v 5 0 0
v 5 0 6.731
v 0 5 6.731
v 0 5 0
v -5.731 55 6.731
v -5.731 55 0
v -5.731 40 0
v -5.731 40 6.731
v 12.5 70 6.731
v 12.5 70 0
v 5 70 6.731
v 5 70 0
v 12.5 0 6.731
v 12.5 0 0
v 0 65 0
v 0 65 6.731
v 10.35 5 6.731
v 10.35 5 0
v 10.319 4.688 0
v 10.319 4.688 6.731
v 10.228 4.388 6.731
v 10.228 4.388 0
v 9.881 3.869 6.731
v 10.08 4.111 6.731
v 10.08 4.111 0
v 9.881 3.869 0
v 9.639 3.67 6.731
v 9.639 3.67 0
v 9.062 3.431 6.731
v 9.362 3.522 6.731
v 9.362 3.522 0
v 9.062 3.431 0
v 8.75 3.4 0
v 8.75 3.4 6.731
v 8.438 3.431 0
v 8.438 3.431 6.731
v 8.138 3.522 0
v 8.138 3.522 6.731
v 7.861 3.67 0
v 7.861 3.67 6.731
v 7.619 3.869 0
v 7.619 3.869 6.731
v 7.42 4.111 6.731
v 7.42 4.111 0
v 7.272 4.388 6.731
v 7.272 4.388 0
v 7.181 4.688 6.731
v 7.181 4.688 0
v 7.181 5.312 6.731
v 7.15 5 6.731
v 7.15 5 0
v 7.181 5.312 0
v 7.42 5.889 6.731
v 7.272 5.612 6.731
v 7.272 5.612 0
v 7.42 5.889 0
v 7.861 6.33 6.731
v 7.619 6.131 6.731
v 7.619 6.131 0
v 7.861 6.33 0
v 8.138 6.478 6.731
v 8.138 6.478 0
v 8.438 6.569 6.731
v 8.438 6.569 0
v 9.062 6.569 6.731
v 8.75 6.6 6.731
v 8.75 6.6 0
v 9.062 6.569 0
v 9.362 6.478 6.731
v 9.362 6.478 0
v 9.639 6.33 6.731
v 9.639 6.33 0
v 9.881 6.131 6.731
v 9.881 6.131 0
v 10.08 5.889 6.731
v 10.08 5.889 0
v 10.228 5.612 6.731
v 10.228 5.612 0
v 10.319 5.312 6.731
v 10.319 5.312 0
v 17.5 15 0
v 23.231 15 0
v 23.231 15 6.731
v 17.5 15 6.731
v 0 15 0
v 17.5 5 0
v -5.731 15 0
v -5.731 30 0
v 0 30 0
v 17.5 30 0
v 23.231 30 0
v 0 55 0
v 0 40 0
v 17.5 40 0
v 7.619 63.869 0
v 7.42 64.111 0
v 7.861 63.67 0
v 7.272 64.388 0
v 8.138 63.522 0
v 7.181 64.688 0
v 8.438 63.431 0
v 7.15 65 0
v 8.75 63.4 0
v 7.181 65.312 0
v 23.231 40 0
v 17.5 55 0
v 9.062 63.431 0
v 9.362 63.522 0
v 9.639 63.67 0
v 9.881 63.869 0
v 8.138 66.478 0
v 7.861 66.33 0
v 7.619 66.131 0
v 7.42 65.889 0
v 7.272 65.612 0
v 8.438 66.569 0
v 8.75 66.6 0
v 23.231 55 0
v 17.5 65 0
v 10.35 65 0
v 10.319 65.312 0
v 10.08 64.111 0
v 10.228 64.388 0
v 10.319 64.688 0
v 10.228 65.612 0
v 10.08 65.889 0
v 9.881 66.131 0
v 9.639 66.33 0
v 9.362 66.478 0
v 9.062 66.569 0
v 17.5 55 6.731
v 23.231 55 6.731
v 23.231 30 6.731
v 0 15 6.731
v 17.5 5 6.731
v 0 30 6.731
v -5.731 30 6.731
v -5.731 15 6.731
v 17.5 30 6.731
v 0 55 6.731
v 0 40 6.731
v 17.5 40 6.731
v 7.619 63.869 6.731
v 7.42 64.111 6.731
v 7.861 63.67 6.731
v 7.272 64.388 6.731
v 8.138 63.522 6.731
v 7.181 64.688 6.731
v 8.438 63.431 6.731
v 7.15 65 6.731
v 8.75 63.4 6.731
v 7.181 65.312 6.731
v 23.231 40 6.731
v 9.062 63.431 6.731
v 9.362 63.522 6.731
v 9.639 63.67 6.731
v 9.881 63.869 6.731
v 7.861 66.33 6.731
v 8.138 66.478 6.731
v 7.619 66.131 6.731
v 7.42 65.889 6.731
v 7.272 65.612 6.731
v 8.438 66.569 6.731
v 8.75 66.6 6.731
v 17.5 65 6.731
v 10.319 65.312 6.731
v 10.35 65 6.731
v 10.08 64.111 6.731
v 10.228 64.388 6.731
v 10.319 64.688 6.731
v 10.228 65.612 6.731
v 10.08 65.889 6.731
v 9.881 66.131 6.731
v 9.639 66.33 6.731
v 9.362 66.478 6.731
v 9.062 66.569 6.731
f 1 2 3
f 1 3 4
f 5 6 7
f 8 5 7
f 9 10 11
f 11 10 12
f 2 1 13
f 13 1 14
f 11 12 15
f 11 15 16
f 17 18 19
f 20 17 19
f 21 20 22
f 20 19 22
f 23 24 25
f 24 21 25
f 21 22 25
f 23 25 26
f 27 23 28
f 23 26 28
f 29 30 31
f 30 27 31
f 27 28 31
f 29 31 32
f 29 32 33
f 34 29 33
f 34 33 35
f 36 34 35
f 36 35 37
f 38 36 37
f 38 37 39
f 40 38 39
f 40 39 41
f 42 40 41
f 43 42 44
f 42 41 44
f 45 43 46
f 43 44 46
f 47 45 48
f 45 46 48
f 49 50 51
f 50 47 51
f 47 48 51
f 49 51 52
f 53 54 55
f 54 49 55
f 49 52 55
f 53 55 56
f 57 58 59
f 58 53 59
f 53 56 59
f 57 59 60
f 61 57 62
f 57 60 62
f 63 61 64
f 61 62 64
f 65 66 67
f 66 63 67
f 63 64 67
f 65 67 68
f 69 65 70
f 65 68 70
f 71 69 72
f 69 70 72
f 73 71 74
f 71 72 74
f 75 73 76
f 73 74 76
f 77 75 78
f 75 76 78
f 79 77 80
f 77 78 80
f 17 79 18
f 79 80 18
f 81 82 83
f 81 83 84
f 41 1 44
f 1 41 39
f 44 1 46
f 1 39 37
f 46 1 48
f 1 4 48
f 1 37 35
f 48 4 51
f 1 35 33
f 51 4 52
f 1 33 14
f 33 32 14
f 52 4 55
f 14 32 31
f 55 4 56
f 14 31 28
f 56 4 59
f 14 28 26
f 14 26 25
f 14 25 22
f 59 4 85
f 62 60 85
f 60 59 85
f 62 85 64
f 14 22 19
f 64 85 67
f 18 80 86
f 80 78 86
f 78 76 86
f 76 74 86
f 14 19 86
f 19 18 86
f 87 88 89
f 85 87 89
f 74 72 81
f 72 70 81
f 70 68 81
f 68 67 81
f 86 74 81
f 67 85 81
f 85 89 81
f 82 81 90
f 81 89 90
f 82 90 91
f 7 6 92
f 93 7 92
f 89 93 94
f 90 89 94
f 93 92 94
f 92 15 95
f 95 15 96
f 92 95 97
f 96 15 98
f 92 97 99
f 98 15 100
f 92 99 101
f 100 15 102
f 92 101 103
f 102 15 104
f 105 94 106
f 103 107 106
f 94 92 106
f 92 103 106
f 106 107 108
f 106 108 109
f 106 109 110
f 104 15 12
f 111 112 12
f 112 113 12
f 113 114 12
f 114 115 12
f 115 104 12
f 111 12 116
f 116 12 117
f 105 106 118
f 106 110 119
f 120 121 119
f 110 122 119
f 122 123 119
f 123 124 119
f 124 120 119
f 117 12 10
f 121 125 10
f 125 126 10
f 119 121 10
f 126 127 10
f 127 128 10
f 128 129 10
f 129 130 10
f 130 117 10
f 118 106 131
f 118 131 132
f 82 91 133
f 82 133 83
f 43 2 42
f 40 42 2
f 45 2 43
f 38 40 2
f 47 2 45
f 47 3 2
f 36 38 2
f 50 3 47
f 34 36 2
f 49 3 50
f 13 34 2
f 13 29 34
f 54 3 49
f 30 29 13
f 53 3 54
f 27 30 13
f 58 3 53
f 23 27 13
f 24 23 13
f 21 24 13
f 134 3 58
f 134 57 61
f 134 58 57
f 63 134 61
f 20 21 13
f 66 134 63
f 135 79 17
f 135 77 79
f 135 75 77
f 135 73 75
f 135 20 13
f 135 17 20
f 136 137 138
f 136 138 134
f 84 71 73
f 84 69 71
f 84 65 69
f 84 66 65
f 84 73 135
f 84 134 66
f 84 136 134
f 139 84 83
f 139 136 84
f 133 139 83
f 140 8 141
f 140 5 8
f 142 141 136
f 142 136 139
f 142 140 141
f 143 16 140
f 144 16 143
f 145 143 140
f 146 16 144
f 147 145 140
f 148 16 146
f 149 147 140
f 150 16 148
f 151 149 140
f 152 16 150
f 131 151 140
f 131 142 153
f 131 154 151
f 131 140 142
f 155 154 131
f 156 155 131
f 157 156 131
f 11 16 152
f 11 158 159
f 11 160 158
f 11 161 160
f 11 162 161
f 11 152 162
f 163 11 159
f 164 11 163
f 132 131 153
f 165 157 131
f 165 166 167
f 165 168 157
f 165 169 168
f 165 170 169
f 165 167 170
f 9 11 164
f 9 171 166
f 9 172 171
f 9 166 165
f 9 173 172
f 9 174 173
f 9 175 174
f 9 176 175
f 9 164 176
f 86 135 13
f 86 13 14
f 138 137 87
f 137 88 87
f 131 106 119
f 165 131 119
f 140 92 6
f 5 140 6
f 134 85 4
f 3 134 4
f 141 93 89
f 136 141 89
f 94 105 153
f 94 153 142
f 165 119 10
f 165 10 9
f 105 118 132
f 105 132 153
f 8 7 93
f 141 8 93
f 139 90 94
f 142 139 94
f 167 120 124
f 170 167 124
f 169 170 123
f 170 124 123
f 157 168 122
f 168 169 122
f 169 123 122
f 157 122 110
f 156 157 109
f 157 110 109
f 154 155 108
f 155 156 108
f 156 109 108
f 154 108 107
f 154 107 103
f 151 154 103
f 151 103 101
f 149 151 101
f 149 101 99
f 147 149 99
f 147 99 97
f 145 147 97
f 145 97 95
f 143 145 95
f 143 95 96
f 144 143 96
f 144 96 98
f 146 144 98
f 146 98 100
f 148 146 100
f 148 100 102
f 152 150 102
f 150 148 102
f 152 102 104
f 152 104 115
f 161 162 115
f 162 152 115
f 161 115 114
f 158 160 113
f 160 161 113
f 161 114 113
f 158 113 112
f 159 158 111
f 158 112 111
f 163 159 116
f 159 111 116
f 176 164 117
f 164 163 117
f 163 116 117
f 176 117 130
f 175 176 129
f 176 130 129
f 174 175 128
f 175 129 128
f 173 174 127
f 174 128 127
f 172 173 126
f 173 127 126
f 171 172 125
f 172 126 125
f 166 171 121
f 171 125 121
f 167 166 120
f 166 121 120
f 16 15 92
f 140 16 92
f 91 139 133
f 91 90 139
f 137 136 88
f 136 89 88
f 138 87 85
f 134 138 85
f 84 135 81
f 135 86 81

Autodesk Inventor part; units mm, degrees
ref_plane "YZ Plane" through (0, 0, 0) normal (1, 0, 0) x (0, 1, 0)
ref_plane "XZ Plane" through (0, 0, 0) normal (0, 1, 0) x (-1, 0, 0)
ref_plane "XY Plane" through (0, 0, 0) normal (0, 0, 1) x (1, 0, 0)
sketch "Sketch1" plane through (0, 0, 0) normal (0, 0, 1) x (1, 0, 0)
  line L0 (0, 0) -> (17.5, 0)
  line L1 (17.5, 0) -> (17.5, 70)
  line L2 (17.5, 70) -> (0, 70)
  line L3 (0, 70) -> (0, 0)
  line L4 (0, 55) -> (-5.731, 55)
  line L5 (-5.731, 55) -> (-5.731, 40)
  line L6 (-5.731, 40) -> (0, 40)
  line L7 (0, 40) -> (0, 55)
  line L8 (0, 30) -> (-5.731, 30)
  line L9 (-5.731, 30) -> (-5.731, 15)
  line L10 (-5.731, 15) -> (0, 15)
  line L11 (0, 15) -> (0, 30)
  circle A0 centre (8.75, 65) radius 1.6
  circle A1 centre (8.75, 5) radius 1.6
  line L12 (17.5, 55) -> (23.231, 55)
  line L13 (23.231, 55) -> (23.231, 40)
  line L14 (23.231, 40) -> (17.5, 40)
  line L15 (17.5, 40) -> (17.5, 55)
  line L16 (17.5, 30) -> (23.231, 30)
  line L17 (23.231, 30) -> (23.231, 15)
  line L18 (23.231, 15) -> (17.5, 15)
  line L19 (17.5, 15) -> (17.5, 30)
  point P0 (8.75, 70)
  dimension "d0" = 17.5
  dimension "d1" = 70
  dimension "d2" = 15
  dimension "d3" = 5.731
  dimension "d4" = 10
  dimension "d5" = 15
  dimension "d6" = 15
  dimension "d7" = 3.2
  dimension "d8" = 5
  dimension "d9" = 5
extrude "Extrusion1" add sketch "Sketch1" along normal blind 6.731
chamfer "Chamfer1" distance 5 angle 45 4 edges at (0, 70, 3.3655) (17.5, 70, 3.3655) (0, 0, 3.3655) (17.5, 0, 3.3655)
equation "\"d5\" = d6"
equation "\"d9\" = d8"
equation "\"d10\" = THICKB"
equation "\"THICKA\" = 3.175"
equation "\"THICKB\" = 6.731"
equation "\"THICKC\" = 12.7"
equation "\"MAGDIA\" = 9.5"
equation "\"BALLDIA\" = 12"
properties part number "Air2D_Bottom"
